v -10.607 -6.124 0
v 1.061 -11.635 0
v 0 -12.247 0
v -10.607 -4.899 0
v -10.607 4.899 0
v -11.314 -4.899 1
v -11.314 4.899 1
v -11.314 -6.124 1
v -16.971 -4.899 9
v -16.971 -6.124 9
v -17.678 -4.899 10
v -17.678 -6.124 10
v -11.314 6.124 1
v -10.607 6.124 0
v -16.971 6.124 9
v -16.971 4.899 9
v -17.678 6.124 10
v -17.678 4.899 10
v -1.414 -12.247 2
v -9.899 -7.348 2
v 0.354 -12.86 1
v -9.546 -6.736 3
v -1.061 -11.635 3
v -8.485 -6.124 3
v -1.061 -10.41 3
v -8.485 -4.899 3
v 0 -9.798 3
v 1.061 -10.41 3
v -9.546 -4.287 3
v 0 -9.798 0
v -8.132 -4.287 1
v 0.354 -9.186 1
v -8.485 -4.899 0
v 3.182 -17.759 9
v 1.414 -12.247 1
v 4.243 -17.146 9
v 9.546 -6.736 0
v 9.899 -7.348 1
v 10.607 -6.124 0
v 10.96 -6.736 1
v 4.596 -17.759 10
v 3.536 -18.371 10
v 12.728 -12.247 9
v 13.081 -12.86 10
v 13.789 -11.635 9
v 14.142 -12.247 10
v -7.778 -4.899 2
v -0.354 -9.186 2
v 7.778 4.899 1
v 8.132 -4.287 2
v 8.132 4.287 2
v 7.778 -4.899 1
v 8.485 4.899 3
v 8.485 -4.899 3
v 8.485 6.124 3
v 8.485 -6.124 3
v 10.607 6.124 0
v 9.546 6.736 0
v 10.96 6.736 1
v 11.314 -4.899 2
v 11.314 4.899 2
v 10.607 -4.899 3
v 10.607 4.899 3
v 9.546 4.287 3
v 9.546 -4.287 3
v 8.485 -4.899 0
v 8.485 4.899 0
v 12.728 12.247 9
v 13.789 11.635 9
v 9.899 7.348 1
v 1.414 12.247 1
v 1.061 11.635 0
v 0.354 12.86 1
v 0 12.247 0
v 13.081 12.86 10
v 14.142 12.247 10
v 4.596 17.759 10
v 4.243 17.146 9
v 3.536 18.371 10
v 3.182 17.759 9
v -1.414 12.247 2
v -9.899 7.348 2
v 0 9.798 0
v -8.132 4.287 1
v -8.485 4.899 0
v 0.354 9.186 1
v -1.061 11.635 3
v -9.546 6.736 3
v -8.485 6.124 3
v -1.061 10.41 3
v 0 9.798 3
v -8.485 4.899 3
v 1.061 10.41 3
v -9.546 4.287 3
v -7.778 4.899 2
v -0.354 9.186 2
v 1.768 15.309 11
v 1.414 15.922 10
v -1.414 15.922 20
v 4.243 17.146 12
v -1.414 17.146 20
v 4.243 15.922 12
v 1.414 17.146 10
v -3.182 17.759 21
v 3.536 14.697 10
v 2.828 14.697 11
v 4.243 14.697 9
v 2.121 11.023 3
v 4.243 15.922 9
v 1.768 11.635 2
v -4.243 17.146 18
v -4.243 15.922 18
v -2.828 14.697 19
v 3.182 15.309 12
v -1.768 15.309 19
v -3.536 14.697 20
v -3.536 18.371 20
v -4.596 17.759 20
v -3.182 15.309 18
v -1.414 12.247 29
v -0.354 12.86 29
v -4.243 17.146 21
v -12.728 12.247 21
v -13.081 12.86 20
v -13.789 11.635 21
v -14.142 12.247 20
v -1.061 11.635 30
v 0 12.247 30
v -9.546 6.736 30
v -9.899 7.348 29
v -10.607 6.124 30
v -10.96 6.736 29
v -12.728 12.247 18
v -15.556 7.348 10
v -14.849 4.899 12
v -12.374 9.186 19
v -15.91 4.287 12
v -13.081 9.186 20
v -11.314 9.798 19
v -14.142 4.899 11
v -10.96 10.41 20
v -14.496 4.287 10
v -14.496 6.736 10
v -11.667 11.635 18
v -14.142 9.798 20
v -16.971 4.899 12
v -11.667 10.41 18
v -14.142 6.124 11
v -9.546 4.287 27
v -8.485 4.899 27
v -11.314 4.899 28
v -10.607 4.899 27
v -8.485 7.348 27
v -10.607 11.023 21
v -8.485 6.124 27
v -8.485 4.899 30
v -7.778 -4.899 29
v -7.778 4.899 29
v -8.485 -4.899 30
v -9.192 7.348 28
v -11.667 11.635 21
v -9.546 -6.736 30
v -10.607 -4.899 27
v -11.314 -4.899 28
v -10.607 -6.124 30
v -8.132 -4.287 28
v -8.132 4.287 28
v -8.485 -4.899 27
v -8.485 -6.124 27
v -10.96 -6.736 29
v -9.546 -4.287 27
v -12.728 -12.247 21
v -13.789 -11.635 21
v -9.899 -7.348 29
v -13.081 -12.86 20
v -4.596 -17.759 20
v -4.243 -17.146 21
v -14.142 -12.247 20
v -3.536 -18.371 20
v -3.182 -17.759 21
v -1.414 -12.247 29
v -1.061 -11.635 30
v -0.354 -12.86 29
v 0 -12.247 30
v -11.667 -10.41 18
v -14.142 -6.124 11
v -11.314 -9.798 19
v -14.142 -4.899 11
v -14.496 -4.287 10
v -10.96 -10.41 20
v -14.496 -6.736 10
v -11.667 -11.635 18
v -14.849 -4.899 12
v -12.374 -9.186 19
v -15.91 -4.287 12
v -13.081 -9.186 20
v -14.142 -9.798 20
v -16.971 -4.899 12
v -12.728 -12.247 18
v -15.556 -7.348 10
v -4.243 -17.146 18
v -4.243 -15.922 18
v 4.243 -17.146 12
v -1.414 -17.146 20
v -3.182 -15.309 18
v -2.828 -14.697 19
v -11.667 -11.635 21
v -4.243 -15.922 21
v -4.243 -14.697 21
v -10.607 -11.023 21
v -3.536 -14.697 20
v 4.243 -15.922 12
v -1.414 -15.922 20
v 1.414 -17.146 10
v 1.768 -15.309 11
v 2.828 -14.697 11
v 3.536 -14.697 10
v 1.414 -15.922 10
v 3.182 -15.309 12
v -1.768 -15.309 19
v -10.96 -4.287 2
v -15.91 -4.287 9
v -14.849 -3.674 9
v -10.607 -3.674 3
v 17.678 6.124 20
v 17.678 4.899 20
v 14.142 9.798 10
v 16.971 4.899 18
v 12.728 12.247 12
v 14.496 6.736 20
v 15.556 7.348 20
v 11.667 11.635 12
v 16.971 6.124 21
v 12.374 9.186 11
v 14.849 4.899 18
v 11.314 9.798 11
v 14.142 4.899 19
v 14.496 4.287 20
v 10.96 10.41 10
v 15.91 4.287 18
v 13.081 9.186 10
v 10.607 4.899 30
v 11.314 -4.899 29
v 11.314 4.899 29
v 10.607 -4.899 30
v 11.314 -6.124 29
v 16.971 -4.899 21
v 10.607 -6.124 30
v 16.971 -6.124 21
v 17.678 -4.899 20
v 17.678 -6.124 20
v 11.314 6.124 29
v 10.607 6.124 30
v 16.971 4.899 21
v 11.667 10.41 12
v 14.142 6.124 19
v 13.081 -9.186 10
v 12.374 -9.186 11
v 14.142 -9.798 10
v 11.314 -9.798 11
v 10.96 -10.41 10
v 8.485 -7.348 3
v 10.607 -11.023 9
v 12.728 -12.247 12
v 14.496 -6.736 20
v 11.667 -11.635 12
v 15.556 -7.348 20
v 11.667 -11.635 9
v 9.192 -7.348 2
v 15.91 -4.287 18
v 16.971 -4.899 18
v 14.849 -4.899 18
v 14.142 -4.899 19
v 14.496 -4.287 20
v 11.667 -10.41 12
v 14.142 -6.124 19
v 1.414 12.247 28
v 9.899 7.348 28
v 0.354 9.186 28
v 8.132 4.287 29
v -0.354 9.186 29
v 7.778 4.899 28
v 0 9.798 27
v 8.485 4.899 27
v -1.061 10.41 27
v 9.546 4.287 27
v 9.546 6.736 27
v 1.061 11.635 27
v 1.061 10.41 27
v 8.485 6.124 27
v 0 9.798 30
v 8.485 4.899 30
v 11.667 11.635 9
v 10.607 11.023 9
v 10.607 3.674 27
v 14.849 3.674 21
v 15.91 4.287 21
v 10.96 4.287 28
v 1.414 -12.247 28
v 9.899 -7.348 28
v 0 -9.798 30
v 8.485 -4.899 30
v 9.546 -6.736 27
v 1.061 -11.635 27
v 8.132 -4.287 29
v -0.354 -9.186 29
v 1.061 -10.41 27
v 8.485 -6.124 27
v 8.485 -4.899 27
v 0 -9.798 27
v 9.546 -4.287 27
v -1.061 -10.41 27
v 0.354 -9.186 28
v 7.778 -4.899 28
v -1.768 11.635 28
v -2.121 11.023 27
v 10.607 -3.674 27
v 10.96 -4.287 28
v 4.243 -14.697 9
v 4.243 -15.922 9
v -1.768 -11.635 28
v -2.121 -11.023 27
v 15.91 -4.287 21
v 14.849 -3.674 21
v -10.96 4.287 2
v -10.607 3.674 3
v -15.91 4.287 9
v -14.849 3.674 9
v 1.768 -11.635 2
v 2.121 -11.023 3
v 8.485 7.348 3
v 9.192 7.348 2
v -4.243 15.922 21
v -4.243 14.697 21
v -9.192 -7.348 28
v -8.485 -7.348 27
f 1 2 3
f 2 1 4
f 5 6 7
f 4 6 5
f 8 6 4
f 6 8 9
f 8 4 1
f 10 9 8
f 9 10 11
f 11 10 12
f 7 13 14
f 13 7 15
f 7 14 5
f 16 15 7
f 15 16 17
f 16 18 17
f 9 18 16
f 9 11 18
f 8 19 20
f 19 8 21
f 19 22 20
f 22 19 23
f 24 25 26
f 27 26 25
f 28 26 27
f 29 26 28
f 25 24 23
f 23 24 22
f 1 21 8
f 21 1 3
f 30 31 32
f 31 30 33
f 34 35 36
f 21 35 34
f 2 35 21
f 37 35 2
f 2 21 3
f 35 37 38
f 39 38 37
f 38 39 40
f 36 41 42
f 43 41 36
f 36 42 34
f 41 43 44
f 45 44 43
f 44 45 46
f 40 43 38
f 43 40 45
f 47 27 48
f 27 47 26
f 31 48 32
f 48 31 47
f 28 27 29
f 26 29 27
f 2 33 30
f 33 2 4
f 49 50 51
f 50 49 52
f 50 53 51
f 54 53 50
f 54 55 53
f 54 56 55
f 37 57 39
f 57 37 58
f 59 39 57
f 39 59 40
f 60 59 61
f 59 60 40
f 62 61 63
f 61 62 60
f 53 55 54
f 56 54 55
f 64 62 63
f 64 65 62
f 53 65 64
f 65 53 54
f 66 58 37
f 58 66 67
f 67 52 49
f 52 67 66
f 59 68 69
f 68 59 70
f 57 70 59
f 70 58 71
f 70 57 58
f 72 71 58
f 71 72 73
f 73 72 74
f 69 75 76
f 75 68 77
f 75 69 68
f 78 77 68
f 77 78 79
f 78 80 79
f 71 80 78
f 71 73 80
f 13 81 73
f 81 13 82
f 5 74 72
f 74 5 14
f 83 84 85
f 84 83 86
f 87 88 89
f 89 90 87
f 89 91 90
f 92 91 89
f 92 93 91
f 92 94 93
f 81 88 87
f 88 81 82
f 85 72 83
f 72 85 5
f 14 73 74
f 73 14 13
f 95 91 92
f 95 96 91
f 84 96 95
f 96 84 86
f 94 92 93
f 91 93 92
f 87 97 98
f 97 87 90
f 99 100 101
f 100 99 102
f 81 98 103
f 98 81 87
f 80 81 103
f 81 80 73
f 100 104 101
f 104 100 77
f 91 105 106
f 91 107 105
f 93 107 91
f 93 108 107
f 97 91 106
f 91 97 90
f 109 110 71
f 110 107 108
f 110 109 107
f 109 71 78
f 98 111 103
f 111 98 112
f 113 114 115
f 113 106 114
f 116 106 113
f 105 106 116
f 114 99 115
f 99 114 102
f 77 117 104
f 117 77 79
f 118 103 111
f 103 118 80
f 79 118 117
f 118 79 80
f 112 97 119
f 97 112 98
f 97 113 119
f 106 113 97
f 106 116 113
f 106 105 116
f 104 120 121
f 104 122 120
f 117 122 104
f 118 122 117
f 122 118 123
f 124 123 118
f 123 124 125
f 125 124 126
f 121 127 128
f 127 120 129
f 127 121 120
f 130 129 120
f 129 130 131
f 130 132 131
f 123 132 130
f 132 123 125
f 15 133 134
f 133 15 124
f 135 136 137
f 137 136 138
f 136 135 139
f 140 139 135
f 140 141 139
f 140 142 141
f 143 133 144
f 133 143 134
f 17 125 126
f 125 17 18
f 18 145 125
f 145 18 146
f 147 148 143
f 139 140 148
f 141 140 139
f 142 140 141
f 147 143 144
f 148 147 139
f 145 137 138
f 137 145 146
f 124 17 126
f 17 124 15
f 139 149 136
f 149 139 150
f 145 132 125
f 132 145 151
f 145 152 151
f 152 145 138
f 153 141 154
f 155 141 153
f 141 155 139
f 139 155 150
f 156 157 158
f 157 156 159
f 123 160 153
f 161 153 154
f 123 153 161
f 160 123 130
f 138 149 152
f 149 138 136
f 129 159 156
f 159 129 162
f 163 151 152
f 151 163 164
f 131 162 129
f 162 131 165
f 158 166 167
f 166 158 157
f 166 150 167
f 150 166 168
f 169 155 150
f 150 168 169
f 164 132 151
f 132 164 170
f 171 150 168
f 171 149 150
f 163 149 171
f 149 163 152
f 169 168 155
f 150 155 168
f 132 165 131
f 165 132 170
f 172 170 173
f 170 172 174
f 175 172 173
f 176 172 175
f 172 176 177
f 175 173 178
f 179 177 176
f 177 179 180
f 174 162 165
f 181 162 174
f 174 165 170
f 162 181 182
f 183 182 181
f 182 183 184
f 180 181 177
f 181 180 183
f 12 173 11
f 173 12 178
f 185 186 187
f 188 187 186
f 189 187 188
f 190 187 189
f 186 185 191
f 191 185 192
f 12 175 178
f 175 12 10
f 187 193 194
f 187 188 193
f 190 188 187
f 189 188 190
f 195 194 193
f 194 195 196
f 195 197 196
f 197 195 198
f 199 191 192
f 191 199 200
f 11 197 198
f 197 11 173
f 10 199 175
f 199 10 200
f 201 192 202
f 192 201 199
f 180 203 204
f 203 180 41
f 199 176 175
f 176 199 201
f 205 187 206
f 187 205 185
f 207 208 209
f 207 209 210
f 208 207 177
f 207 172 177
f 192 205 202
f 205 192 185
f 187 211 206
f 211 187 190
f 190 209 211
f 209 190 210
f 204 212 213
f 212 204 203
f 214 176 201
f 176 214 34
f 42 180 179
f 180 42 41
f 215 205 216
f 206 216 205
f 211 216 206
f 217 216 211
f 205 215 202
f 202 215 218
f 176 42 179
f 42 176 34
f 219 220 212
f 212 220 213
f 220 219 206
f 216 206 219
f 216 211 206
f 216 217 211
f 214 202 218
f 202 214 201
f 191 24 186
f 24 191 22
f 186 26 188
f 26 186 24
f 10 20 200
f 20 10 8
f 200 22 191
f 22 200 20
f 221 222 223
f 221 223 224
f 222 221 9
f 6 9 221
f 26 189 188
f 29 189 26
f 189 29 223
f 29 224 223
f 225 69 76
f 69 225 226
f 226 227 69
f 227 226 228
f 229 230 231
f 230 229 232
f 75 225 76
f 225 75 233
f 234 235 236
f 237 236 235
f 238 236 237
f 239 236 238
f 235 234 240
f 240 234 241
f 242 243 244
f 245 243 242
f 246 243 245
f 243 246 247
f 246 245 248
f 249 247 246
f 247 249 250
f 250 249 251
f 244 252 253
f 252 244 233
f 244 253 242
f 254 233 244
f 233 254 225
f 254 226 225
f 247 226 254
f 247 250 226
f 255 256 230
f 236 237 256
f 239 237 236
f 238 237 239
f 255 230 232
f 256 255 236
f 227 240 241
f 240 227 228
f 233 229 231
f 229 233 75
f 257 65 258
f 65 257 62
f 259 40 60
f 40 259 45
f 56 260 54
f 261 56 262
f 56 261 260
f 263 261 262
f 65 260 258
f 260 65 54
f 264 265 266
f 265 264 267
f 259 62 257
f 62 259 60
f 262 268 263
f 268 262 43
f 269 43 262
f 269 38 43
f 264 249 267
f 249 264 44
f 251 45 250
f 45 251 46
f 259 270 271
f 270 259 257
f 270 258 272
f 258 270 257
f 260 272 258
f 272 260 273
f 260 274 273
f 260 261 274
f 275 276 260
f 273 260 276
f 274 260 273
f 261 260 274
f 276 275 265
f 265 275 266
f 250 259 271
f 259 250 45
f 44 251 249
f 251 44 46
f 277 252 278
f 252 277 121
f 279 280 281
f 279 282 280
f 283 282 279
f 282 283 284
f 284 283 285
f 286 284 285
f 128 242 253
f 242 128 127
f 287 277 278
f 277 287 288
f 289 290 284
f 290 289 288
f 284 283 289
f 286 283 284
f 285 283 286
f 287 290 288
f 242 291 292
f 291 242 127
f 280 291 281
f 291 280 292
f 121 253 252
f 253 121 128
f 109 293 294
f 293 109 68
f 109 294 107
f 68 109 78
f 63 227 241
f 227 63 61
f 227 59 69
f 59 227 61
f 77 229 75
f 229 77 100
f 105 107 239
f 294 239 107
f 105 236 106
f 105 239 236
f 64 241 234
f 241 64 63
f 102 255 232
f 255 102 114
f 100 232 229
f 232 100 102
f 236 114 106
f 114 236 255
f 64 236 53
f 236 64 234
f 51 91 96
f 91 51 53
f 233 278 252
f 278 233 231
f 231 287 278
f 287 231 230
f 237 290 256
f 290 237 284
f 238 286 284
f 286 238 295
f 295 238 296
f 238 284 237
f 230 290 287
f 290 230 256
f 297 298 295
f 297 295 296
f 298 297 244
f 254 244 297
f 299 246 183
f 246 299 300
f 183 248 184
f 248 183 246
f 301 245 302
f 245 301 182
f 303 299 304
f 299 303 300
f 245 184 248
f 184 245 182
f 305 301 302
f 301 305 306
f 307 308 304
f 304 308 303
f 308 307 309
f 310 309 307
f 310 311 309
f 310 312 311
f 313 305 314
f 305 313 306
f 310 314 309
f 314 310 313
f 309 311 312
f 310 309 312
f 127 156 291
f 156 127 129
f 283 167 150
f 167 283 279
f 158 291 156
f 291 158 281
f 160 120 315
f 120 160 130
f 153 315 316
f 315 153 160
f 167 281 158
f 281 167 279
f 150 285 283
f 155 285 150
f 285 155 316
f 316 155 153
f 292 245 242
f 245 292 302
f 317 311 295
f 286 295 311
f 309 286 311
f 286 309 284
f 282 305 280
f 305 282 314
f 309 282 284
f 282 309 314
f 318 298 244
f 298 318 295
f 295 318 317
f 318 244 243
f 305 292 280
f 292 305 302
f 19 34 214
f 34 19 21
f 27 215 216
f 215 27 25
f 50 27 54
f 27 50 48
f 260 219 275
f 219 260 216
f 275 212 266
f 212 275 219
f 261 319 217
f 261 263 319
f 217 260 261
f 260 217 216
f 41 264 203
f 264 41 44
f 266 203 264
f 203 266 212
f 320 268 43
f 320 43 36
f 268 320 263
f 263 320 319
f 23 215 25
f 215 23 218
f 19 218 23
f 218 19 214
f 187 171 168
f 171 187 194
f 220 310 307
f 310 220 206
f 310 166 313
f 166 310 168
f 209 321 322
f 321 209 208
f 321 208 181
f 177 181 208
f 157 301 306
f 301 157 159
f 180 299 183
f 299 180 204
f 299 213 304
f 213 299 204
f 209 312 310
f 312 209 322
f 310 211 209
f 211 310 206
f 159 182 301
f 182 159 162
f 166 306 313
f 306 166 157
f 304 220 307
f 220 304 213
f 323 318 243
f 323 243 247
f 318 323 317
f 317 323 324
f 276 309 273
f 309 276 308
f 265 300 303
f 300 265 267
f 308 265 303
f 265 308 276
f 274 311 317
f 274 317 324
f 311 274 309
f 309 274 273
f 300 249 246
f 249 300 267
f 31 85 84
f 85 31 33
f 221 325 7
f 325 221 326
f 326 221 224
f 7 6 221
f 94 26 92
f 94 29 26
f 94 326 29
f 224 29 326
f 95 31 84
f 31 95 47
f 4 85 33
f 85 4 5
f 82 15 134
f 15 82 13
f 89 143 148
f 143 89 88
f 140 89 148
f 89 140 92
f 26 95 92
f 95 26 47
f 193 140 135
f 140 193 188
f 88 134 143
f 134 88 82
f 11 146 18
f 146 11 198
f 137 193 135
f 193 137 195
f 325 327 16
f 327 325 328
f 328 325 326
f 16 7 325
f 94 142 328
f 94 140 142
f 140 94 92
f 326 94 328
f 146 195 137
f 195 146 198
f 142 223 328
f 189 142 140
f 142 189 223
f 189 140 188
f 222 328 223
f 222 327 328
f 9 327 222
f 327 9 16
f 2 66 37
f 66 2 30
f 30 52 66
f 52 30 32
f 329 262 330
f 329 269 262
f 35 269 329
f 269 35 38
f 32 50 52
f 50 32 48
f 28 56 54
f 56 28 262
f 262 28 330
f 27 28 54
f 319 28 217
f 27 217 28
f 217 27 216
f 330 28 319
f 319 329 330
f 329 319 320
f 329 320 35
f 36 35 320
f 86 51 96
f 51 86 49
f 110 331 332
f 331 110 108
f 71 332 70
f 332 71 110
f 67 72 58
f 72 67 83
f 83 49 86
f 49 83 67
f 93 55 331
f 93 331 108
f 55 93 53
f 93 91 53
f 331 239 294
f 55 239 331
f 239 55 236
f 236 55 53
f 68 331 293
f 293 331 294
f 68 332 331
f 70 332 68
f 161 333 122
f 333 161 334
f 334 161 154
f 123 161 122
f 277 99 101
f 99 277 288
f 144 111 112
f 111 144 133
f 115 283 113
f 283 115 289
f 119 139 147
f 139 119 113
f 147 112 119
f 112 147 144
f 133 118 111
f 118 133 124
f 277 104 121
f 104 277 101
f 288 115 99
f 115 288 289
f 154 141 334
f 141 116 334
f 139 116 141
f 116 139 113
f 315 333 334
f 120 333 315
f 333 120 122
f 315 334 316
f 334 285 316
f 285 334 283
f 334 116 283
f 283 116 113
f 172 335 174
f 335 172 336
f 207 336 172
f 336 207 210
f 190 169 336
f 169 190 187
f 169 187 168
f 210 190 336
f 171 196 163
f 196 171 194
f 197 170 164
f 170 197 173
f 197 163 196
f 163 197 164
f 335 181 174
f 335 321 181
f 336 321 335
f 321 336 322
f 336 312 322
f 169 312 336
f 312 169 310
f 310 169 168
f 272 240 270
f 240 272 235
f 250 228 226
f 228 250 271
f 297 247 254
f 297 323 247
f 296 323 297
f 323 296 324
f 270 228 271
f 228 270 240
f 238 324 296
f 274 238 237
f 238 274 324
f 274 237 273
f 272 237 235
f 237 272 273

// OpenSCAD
// shape height
sh = 30;
// border width
bw = 3;

include <../polyhedra.scad>;

poly_wire(truncated_octahedron);
